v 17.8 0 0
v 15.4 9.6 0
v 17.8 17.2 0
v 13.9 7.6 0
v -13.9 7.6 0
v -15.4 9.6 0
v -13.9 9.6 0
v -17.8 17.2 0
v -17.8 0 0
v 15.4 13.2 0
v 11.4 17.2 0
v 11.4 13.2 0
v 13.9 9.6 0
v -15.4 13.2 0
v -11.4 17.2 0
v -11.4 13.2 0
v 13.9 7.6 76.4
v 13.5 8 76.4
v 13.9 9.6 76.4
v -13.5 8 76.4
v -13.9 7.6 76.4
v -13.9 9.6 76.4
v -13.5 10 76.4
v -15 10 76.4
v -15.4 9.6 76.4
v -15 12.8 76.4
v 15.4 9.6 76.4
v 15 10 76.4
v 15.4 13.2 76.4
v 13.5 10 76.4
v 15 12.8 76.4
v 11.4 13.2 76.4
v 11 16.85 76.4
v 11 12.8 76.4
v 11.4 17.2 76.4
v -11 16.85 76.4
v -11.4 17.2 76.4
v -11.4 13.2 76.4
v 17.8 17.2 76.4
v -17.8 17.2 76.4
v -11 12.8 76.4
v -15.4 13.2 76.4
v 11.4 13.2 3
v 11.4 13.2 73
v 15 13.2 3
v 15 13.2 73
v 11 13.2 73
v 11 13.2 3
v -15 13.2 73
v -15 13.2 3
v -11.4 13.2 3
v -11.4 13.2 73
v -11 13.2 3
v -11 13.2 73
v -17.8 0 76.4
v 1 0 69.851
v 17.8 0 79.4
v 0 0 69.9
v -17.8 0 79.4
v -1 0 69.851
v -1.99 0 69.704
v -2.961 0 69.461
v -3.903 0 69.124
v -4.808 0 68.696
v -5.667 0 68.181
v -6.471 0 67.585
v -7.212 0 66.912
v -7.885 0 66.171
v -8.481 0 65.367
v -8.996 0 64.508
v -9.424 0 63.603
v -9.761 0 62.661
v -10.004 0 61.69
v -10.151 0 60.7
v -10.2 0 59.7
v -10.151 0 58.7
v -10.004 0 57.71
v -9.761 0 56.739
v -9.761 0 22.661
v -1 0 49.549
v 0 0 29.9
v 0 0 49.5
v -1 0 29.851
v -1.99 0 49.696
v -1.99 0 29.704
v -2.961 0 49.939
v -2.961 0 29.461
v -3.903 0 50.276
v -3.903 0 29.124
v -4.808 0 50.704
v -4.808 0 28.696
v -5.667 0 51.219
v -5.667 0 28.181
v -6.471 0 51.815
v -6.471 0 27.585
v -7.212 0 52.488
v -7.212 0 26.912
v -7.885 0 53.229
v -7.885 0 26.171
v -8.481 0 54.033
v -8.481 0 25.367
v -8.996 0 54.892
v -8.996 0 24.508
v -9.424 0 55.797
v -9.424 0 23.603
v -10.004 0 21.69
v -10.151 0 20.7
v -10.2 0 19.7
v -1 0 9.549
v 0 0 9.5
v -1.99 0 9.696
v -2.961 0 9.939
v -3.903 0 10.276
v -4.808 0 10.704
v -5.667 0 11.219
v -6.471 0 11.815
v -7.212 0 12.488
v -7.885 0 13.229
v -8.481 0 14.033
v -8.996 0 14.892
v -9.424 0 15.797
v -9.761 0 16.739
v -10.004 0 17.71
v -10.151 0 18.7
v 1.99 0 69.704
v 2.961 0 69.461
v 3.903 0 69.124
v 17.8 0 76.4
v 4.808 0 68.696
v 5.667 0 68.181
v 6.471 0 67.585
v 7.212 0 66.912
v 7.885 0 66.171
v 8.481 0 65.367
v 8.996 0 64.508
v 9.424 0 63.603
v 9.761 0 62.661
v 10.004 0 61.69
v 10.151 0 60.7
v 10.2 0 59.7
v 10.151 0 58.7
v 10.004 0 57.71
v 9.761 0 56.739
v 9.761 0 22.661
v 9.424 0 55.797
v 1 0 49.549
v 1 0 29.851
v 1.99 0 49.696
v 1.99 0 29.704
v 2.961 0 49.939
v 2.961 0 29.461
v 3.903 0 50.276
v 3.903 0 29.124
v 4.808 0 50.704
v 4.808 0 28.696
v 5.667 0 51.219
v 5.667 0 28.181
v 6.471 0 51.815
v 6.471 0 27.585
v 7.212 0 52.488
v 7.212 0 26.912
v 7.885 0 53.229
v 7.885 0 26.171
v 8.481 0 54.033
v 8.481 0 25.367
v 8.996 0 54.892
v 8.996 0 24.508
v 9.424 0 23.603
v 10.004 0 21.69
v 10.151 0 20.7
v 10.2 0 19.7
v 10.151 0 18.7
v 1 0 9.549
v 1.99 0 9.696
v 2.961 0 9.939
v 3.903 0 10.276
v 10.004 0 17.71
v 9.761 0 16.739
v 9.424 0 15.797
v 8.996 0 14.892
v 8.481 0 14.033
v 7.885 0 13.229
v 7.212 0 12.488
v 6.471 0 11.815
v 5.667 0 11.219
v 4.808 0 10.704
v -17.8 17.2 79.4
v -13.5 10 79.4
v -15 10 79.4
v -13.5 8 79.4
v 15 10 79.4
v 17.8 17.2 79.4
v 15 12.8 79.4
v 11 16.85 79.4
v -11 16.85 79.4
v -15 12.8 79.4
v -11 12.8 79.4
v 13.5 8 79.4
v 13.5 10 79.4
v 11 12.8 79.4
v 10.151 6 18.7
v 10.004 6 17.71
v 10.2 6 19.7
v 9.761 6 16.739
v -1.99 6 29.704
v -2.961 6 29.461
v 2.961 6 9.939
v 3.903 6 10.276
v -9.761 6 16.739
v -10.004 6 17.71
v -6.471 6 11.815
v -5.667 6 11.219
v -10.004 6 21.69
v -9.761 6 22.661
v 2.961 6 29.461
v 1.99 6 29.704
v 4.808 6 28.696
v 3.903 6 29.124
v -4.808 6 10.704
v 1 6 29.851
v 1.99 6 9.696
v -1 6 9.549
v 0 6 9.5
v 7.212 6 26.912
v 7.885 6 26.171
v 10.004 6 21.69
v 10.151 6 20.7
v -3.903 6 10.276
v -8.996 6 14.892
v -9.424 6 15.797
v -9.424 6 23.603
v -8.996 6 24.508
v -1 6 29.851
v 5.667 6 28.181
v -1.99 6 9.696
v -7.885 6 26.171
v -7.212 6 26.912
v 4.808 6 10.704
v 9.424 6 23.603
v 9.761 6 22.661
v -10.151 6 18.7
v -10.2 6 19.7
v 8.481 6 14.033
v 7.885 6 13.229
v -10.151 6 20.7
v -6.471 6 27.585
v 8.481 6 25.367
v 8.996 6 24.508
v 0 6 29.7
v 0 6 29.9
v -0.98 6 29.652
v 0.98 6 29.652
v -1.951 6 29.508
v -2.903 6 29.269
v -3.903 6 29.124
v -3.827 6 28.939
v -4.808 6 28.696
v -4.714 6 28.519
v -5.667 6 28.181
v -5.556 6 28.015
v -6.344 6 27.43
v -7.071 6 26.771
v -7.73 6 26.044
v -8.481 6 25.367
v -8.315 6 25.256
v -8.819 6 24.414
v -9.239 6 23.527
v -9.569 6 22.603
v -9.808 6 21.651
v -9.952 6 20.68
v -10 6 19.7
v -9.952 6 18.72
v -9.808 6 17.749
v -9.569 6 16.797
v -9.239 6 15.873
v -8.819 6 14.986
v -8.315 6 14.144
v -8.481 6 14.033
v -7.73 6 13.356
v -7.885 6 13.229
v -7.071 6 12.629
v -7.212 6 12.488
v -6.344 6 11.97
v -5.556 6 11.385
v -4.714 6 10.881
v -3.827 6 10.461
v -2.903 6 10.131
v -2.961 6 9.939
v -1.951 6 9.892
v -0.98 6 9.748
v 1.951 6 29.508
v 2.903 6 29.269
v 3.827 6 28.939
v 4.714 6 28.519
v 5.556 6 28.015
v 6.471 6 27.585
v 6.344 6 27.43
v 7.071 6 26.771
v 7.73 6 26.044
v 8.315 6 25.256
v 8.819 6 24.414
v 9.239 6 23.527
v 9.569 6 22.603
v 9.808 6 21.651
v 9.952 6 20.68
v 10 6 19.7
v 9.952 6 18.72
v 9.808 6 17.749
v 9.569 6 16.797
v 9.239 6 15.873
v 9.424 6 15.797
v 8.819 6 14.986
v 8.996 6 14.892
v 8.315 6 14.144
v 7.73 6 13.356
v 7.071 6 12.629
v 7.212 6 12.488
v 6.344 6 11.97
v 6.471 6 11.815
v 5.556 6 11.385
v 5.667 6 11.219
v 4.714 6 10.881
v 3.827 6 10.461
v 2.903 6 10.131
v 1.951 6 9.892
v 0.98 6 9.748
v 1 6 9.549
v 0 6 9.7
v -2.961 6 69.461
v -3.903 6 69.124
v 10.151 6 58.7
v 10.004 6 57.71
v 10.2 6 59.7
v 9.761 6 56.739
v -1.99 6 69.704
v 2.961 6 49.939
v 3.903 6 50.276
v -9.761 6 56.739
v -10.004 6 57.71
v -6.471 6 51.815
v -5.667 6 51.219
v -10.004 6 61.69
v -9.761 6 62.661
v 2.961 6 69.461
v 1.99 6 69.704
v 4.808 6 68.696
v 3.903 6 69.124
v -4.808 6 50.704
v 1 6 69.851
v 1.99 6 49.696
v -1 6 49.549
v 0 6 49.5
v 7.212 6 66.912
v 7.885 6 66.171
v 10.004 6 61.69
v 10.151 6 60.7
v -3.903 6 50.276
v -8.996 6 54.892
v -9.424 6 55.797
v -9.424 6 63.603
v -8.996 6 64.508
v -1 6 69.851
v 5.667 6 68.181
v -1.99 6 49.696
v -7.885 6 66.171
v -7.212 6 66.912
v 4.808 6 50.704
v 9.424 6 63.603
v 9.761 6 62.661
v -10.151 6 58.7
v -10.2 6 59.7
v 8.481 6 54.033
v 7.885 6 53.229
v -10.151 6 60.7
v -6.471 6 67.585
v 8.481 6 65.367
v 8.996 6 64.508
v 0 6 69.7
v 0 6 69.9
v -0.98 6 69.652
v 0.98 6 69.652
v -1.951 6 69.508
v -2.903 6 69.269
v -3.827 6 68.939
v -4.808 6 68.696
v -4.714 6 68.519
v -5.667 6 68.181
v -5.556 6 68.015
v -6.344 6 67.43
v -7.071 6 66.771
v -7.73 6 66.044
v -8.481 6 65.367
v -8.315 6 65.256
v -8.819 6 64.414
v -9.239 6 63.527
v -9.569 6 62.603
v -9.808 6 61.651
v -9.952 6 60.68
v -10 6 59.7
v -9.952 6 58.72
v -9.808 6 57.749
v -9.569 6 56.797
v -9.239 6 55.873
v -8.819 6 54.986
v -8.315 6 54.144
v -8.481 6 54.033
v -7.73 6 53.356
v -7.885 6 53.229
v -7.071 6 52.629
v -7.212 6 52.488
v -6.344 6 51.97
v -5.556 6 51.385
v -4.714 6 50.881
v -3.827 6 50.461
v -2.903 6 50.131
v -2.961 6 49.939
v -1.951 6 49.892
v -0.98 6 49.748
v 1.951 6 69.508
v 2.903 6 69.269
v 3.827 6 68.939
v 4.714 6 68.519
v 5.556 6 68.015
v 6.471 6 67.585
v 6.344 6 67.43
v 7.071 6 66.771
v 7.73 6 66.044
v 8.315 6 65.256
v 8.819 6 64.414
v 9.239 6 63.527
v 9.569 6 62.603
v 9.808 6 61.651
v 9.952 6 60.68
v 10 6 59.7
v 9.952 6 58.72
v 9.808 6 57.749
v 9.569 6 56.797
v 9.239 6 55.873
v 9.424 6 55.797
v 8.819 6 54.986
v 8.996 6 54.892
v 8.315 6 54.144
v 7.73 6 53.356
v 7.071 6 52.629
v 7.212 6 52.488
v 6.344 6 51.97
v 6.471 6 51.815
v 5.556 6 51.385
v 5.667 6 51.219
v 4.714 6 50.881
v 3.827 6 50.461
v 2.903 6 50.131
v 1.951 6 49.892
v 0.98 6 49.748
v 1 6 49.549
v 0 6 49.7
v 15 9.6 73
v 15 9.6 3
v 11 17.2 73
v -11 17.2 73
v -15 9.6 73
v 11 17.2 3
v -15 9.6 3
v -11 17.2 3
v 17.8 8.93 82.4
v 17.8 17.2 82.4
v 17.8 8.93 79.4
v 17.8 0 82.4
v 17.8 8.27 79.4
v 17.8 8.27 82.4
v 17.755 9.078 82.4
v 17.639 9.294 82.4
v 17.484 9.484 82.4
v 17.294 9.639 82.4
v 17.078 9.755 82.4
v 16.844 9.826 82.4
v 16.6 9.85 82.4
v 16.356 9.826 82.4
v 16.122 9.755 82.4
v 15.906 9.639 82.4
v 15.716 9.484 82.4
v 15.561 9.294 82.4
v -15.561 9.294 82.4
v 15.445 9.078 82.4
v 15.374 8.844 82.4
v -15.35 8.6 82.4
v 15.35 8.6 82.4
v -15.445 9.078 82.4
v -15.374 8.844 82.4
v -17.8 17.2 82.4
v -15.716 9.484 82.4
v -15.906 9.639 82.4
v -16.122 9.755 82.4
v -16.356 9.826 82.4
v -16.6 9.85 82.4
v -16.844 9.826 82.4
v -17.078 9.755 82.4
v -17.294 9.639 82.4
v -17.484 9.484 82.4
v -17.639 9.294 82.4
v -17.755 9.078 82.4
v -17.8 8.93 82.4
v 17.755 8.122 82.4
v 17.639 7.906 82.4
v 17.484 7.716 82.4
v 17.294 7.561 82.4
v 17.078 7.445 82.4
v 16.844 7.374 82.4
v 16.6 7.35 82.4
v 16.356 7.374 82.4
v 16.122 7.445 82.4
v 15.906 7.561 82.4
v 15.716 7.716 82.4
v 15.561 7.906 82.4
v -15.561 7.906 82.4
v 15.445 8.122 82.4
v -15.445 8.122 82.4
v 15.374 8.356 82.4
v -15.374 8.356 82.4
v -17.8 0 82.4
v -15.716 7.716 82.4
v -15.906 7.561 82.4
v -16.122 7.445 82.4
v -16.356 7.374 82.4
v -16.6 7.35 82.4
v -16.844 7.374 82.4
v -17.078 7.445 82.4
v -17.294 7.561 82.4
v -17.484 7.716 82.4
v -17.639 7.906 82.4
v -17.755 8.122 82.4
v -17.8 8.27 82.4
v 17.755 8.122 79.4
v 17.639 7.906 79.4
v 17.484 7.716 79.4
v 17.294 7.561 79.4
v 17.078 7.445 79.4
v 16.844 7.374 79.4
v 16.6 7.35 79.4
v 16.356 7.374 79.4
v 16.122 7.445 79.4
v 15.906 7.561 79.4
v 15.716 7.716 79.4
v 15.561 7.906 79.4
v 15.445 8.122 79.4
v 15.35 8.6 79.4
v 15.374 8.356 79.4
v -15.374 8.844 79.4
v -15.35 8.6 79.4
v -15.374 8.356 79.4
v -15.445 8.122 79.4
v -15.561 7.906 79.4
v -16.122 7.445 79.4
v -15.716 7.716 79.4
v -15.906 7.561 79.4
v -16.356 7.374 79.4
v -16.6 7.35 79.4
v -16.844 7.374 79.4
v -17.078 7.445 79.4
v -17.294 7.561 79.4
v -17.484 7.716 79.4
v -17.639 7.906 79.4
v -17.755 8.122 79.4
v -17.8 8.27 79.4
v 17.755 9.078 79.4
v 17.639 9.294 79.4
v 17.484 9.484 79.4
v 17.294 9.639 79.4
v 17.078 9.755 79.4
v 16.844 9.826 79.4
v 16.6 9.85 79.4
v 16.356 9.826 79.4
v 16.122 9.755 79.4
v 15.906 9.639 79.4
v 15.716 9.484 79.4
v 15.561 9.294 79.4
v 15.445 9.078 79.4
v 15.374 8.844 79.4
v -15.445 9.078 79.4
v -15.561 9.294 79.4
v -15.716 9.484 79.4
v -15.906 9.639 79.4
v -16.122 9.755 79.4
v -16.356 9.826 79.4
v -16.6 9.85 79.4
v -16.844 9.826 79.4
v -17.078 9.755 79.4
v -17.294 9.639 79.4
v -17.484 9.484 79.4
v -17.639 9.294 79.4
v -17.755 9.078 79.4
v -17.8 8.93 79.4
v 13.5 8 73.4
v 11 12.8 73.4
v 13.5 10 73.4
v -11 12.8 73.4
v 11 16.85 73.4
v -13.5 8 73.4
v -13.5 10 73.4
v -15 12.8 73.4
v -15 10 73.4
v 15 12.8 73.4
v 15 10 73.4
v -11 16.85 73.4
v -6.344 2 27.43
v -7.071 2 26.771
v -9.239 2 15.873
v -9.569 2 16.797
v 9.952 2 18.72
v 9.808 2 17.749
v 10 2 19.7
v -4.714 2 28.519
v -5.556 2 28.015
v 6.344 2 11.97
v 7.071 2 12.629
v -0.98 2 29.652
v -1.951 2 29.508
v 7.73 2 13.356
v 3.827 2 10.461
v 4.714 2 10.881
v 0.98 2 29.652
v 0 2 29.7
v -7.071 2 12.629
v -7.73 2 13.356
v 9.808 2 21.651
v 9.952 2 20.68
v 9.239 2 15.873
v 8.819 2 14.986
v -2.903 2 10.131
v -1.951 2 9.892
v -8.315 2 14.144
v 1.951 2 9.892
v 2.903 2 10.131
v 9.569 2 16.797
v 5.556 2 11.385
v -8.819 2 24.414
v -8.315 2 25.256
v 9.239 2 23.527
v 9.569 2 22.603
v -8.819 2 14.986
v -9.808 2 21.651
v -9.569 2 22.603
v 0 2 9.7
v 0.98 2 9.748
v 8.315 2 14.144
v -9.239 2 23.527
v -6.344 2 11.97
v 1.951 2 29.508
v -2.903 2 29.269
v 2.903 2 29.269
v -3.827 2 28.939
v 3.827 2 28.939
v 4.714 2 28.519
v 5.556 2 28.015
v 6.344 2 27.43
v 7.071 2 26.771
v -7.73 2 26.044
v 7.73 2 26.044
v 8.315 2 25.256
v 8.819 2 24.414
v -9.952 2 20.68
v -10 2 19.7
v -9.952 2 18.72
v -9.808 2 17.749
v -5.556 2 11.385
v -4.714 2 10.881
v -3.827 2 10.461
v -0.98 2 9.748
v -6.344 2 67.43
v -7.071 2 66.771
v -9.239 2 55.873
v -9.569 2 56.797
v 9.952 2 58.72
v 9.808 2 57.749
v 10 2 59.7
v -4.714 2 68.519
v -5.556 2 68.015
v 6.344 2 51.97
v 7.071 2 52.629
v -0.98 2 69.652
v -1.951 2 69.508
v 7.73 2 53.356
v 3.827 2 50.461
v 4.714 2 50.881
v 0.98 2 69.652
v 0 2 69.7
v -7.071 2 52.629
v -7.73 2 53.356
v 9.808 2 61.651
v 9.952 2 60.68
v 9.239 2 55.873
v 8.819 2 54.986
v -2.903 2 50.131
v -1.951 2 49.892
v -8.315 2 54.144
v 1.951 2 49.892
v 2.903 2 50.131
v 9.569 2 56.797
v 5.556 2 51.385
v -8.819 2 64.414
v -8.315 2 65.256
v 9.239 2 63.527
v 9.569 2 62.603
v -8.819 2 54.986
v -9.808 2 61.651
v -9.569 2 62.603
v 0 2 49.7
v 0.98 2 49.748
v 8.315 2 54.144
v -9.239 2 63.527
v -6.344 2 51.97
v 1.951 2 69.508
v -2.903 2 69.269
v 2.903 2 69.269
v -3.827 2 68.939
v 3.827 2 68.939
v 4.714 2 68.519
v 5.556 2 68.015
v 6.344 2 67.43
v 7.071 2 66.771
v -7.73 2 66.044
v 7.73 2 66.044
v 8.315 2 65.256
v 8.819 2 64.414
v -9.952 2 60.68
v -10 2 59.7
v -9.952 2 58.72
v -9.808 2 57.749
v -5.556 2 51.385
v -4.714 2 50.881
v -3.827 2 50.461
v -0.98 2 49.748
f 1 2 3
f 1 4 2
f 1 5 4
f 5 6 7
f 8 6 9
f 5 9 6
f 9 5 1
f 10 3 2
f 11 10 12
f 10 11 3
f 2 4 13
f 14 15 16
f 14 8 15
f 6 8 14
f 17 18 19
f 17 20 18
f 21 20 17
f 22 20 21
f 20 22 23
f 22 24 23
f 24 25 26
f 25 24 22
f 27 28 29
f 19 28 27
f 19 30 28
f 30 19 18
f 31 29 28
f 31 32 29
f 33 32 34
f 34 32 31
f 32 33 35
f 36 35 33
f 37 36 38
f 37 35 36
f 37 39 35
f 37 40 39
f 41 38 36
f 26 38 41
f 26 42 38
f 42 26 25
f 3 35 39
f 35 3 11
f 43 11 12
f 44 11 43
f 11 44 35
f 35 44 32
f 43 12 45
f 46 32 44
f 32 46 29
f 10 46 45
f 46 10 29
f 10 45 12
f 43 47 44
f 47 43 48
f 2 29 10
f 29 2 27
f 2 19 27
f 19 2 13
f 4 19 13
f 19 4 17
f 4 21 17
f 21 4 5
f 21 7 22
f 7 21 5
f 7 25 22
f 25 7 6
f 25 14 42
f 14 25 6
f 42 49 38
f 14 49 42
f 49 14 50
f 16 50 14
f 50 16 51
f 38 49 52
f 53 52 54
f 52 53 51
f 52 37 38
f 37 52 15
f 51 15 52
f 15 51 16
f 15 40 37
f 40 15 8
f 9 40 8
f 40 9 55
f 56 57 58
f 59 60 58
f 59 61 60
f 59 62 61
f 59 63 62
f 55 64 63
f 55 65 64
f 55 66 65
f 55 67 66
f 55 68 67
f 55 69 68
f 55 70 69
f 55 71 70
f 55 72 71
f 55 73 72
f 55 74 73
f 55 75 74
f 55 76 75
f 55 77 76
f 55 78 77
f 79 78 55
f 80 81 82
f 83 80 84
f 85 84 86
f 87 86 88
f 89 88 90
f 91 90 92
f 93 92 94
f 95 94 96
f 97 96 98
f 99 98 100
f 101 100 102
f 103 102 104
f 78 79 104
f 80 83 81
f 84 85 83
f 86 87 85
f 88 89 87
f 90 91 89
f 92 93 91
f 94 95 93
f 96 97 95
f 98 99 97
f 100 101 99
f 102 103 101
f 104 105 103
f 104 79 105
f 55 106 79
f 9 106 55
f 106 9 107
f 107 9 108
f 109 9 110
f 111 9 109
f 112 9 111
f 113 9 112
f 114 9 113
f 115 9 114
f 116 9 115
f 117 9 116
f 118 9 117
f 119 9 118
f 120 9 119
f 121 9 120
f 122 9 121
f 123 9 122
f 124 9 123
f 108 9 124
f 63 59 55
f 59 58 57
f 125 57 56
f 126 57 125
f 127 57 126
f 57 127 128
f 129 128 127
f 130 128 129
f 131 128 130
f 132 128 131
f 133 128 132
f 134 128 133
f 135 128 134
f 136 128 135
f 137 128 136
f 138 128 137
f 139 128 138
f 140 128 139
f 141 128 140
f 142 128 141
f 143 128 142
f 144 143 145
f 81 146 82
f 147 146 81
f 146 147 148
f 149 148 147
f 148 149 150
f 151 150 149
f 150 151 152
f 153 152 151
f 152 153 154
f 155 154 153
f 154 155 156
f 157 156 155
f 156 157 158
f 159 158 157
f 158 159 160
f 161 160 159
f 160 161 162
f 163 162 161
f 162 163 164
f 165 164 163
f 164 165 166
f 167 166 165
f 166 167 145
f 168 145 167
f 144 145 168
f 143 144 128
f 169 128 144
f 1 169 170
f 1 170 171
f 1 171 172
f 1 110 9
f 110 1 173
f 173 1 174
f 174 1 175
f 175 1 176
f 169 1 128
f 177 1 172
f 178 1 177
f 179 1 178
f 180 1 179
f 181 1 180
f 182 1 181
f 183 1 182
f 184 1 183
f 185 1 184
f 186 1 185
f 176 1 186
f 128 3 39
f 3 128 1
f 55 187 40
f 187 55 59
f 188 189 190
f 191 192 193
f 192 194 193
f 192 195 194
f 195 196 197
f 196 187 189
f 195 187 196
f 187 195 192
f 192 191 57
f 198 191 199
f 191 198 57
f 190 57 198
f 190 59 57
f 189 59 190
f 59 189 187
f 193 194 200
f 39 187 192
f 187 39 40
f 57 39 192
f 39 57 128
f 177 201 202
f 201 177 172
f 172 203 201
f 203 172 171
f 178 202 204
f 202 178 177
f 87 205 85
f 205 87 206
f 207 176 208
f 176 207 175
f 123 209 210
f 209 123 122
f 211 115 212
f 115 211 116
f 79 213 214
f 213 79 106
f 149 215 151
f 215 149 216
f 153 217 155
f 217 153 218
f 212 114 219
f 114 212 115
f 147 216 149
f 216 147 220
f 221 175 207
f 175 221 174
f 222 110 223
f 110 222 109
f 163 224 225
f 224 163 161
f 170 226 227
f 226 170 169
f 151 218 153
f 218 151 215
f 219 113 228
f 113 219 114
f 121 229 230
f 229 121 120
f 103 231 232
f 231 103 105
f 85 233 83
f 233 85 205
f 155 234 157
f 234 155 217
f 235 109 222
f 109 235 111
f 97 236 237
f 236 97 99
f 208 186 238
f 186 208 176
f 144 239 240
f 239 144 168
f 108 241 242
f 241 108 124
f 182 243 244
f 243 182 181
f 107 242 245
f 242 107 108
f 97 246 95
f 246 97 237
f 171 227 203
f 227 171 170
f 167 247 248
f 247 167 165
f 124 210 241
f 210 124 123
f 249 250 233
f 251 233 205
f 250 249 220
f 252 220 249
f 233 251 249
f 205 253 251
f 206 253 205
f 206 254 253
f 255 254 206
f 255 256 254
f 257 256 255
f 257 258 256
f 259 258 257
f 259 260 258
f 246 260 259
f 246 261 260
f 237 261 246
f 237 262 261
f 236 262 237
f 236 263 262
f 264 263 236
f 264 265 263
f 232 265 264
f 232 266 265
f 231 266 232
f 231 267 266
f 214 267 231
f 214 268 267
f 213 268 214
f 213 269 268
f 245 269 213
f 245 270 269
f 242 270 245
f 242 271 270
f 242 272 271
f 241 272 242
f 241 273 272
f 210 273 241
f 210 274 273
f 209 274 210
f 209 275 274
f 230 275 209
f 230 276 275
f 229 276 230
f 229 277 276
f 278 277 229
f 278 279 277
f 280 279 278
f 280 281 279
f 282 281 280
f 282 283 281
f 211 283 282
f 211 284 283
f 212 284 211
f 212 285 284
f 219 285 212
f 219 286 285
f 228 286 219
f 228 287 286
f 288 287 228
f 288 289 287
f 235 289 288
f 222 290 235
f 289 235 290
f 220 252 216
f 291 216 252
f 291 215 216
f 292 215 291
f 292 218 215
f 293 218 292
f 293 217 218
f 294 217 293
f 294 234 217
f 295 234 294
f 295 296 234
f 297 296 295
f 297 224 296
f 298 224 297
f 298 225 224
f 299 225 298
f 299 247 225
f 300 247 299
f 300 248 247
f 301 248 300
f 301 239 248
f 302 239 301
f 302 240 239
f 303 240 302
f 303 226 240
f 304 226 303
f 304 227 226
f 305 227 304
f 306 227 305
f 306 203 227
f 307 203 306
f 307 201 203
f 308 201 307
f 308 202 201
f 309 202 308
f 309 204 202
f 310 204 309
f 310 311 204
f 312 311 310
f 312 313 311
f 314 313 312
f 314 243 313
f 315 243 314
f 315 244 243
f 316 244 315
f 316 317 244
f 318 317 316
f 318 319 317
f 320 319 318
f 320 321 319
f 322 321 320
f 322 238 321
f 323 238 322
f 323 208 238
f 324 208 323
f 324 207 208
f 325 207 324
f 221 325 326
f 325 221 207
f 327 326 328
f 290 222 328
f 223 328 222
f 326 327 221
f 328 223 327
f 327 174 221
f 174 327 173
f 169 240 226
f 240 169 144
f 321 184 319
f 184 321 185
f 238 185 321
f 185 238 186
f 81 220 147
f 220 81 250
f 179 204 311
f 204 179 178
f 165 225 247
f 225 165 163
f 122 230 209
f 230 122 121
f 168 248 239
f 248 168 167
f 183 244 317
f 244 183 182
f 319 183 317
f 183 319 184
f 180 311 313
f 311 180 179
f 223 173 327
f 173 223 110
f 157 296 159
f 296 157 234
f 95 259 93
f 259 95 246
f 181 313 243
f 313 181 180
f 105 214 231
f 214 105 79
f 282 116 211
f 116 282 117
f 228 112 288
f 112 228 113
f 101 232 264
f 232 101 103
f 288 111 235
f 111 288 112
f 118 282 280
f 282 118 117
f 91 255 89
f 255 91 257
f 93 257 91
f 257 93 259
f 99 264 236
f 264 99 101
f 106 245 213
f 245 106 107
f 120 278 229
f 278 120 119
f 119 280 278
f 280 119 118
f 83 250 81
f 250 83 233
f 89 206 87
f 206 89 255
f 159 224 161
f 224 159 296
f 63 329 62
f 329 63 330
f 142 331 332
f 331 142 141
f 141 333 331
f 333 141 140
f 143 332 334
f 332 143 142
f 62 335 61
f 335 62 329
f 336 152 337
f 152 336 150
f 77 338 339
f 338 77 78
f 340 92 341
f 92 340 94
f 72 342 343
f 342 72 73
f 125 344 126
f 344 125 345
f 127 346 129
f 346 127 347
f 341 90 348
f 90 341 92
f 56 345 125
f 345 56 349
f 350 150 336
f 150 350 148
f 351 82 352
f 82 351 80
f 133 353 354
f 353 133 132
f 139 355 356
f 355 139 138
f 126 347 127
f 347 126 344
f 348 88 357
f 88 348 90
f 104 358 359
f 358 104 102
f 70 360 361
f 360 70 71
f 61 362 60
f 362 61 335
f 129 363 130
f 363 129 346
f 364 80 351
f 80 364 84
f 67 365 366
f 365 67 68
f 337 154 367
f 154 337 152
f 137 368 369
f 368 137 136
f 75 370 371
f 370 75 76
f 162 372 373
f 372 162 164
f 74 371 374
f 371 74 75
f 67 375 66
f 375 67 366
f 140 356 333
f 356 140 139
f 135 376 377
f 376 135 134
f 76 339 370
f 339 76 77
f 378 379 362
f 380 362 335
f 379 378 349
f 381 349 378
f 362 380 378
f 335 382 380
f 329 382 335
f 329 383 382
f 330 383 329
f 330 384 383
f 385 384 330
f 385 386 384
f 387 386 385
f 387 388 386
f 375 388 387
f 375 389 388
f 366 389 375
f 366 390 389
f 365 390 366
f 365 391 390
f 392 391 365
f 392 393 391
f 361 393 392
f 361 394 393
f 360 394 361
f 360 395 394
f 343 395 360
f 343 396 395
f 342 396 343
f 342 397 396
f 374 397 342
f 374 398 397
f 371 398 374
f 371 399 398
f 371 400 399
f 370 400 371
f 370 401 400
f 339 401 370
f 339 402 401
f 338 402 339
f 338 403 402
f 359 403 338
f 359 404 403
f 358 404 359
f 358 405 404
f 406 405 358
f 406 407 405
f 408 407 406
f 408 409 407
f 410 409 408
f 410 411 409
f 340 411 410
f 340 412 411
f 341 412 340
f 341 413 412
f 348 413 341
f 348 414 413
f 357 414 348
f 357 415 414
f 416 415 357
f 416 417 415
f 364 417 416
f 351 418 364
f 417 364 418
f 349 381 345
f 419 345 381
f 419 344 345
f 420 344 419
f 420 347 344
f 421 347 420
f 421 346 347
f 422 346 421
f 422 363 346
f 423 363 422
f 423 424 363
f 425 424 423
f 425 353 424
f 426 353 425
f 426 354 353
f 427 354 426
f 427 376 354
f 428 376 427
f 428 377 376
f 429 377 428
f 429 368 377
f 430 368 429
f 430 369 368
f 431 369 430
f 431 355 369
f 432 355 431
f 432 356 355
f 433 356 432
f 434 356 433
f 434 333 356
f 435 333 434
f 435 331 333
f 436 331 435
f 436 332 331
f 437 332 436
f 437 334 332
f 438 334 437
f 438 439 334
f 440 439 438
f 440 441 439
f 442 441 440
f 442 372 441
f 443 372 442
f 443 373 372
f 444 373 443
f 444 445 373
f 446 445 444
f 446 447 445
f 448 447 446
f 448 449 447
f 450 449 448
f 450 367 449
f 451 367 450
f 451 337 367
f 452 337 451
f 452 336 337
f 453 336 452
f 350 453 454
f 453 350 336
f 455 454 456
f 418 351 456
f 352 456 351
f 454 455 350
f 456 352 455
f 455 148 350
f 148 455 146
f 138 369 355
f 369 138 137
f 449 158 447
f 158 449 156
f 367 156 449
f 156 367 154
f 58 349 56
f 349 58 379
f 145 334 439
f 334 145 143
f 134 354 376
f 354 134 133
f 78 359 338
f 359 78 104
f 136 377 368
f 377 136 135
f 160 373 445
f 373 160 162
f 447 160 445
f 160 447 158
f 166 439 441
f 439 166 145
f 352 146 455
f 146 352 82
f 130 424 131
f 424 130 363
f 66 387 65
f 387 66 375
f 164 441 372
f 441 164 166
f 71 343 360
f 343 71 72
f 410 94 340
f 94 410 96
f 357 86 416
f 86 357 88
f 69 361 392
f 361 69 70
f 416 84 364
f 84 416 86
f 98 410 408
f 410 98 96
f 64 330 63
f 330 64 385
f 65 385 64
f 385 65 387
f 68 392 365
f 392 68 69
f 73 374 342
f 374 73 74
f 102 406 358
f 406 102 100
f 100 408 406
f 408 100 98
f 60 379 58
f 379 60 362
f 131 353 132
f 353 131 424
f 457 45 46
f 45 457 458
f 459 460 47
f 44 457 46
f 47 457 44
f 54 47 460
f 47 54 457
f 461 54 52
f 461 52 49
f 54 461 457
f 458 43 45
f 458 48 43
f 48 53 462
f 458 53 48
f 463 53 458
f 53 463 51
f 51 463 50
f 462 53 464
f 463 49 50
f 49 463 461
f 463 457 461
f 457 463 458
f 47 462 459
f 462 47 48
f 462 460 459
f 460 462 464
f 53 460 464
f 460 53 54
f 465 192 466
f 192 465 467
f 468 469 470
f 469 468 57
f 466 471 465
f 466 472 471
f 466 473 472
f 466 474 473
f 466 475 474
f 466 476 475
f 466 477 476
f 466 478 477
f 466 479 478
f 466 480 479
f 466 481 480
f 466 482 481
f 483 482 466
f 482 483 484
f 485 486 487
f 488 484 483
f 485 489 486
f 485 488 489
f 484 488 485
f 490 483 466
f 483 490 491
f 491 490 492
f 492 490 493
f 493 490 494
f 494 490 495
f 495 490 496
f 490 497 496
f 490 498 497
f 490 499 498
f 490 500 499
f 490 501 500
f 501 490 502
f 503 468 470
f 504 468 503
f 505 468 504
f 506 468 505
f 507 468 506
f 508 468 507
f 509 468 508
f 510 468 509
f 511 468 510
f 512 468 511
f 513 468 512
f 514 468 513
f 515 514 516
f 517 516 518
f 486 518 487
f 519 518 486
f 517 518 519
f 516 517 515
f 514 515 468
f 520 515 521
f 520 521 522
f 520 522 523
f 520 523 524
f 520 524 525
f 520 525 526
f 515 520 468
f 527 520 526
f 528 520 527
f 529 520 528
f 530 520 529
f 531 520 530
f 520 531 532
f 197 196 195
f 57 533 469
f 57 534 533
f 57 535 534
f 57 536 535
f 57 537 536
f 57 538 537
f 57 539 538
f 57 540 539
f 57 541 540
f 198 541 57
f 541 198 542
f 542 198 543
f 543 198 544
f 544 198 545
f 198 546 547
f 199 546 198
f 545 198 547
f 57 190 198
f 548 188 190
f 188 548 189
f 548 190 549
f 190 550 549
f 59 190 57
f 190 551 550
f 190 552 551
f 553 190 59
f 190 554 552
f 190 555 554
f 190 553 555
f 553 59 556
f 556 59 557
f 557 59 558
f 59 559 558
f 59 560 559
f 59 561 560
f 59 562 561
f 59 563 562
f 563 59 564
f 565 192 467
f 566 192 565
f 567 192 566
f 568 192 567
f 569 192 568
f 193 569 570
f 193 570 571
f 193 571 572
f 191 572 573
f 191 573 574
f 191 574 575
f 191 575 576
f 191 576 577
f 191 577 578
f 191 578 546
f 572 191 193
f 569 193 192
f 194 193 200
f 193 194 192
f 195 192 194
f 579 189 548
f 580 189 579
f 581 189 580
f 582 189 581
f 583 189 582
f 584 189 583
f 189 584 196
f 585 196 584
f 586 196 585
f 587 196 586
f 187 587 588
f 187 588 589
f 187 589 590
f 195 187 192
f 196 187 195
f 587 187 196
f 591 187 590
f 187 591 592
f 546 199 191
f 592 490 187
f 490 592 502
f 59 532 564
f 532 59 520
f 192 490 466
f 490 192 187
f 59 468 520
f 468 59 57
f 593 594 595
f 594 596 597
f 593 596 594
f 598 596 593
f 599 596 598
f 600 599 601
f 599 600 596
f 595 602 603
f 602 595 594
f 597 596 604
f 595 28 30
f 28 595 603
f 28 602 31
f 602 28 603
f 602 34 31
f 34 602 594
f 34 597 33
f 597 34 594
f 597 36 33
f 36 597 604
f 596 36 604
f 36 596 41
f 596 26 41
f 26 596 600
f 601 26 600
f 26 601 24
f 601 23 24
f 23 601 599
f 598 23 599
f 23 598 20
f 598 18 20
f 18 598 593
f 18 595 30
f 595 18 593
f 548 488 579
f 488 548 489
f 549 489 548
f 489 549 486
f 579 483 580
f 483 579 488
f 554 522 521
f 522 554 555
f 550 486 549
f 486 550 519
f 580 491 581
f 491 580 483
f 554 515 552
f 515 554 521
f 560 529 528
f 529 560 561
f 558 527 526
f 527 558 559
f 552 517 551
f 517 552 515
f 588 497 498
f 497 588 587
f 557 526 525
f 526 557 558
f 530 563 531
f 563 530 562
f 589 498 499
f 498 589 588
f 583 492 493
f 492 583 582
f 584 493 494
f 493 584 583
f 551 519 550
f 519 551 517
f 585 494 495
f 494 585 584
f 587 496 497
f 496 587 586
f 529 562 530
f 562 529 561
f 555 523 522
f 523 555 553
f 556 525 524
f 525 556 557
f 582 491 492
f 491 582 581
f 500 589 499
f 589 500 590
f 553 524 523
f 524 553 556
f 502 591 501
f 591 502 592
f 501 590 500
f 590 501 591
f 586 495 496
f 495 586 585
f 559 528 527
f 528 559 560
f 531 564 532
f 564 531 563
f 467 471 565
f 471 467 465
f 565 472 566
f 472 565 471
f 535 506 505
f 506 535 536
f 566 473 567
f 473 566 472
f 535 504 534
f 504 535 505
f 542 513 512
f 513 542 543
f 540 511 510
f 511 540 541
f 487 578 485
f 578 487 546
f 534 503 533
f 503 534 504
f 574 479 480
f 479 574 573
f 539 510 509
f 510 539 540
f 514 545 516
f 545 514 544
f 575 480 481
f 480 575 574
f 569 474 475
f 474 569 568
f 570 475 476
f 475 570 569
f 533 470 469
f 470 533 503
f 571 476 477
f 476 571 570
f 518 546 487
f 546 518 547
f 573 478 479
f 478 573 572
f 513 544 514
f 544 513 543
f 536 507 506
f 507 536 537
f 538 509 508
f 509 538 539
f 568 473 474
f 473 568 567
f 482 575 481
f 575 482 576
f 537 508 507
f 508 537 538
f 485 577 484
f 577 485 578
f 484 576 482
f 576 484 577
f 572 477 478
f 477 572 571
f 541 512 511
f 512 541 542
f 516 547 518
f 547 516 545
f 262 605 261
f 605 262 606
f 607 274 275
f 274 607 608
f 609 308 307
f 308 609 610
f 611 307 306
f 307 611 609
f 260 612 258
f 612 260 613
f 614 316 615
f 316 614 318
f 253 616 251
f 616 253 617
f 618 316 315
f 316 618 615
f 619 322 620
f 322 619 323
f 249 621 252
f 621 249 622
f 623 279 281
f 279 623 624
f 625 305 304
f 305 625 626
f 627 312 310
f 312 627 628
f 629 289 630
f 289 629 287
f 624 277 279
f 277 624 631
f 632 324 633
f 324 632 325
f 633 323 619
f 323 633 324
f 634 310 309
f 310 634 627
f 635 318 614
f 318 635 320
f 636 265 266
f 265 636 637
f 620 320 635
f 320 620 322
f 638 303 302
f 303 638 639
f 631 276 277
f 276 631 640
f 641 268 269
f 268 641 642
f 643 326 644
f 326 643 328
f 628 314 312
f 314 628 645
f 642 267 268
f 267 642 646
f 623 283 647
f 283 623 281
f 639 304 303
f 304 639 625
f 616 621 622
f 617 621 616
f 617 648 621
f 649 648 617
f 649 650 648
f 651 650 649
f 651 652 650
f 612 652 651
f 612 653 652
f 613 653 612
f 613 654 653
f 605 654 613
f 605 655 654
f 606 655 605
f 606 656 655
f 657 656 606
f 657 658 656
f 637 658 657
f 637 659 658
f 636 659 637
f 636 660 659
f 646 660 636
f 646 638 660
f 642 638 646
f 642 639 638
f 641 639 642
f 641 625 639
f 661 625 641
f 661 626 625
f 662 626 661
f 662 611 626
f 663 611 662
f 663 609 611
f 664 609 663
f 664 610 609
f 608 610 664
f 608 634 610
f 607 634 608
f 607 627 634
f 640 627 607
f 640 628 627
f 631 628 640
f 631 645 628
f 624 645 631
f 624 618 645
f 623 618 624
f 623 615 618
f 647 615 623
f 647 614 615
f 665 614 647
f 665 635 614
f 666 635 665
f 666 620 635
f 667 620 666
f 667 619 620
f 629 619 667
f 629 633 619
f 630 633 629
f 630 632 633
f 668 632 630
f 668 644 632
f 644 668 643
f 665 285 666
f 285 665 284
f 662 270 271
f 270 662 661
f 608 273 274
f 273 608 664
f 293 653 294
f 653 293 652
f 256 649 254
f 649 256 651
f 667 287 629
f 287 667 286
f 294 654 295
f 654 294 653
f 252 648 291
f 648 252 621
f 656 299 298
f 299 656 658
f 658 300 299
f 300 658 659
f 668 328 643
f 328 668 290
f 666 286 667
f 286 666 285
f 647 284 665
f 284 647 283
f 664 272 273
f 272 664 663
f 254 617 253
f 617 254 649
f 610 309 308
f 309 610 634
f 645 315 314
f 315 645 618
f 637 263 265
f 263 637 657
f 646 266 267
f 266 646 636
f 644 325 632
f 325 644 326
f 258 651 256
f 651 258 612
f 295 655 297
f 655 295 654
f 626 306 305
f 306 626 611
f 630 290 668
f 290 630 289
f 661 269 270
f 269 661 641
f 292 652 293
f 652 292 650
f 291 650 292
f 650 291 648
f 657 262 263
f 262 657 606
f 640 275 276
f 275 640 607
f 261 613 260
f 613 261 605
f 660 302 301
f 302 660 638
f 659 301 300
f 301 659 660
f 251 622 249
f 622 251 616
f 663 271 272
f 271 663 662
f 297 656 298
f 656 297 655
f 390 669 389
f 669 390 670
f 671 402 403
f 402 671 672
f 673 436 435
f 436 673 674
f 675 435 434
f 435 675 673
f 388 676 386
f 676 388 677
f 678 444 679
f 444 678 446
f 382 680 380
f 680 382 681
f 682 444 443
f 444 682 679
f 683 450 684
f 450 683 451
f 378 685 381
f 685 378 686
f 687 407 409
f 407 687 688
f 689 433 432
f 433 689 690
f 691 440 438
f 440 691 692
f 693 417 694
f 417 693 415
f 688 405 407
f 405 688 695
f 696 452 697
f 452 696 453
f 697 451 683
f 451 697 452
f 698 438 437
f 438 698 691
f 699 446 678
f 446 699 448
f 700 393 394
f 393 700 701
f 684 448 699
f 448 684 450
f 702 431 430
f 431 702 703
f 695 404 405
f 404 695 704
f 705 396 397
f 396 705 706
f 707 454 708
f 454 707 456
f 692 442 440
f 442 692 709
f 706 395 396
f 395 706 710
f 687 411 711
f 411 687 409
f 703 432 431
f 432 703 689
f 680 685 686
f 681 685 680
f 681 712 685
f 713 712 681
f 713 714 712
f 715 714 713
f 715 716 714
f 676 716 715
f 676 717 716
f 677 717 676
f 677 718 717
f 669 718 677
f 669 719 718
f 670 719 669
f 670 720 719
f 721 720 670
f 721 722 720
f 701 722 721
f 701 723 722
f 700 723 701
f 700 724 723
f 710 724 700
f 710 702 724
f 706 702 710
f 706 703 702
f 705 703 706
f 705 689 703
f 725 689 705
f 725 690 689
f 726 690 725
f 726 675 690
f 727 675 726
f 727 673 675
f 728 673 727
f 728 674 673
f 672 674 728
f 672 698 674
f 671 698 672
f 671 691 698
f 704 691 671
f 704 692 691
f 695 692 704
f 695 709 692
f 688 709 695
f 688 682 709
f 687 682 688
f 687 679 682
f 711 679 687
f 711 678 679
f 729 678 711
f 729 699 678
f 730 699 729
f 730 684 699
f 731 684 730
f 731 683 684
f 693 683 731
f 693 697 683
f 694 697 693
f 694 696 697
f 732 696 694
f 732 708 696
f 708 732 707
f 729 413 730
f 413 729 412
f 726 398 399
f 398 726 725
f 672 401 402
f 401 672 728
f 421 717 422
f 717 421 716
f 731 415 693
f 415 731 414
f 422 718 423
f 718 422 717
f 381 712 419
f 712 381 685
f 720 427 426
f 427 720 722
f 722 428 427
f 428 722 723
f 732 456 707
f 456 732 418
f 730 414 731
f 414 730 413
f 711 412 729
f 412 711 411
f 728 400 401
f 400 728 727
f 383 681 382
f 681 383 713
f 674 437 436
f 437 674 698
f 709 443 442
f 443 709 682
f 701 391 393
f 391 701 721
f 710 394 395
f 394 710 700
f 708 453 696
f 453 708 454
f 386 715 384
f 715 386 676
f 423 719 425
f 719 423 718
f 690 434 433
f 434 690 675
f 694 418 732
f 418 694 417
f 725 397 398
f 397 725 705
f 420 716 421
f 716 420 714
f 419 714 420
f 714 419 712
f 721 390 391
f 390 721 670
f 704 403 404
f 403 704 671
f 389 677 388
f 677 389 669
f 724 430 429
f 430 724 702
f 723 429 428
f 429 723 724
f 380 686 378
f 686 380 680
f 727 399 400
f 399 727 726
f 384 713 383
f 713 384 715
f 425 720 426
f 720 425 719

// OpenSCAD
// Preview only (do not print): body + PCB + poured lens + end cap + magnets.
//   openscad -o ../stl/assembly.stl assembly.scad   # or open in the GUI
include <enclosure.scad>
assembly();
